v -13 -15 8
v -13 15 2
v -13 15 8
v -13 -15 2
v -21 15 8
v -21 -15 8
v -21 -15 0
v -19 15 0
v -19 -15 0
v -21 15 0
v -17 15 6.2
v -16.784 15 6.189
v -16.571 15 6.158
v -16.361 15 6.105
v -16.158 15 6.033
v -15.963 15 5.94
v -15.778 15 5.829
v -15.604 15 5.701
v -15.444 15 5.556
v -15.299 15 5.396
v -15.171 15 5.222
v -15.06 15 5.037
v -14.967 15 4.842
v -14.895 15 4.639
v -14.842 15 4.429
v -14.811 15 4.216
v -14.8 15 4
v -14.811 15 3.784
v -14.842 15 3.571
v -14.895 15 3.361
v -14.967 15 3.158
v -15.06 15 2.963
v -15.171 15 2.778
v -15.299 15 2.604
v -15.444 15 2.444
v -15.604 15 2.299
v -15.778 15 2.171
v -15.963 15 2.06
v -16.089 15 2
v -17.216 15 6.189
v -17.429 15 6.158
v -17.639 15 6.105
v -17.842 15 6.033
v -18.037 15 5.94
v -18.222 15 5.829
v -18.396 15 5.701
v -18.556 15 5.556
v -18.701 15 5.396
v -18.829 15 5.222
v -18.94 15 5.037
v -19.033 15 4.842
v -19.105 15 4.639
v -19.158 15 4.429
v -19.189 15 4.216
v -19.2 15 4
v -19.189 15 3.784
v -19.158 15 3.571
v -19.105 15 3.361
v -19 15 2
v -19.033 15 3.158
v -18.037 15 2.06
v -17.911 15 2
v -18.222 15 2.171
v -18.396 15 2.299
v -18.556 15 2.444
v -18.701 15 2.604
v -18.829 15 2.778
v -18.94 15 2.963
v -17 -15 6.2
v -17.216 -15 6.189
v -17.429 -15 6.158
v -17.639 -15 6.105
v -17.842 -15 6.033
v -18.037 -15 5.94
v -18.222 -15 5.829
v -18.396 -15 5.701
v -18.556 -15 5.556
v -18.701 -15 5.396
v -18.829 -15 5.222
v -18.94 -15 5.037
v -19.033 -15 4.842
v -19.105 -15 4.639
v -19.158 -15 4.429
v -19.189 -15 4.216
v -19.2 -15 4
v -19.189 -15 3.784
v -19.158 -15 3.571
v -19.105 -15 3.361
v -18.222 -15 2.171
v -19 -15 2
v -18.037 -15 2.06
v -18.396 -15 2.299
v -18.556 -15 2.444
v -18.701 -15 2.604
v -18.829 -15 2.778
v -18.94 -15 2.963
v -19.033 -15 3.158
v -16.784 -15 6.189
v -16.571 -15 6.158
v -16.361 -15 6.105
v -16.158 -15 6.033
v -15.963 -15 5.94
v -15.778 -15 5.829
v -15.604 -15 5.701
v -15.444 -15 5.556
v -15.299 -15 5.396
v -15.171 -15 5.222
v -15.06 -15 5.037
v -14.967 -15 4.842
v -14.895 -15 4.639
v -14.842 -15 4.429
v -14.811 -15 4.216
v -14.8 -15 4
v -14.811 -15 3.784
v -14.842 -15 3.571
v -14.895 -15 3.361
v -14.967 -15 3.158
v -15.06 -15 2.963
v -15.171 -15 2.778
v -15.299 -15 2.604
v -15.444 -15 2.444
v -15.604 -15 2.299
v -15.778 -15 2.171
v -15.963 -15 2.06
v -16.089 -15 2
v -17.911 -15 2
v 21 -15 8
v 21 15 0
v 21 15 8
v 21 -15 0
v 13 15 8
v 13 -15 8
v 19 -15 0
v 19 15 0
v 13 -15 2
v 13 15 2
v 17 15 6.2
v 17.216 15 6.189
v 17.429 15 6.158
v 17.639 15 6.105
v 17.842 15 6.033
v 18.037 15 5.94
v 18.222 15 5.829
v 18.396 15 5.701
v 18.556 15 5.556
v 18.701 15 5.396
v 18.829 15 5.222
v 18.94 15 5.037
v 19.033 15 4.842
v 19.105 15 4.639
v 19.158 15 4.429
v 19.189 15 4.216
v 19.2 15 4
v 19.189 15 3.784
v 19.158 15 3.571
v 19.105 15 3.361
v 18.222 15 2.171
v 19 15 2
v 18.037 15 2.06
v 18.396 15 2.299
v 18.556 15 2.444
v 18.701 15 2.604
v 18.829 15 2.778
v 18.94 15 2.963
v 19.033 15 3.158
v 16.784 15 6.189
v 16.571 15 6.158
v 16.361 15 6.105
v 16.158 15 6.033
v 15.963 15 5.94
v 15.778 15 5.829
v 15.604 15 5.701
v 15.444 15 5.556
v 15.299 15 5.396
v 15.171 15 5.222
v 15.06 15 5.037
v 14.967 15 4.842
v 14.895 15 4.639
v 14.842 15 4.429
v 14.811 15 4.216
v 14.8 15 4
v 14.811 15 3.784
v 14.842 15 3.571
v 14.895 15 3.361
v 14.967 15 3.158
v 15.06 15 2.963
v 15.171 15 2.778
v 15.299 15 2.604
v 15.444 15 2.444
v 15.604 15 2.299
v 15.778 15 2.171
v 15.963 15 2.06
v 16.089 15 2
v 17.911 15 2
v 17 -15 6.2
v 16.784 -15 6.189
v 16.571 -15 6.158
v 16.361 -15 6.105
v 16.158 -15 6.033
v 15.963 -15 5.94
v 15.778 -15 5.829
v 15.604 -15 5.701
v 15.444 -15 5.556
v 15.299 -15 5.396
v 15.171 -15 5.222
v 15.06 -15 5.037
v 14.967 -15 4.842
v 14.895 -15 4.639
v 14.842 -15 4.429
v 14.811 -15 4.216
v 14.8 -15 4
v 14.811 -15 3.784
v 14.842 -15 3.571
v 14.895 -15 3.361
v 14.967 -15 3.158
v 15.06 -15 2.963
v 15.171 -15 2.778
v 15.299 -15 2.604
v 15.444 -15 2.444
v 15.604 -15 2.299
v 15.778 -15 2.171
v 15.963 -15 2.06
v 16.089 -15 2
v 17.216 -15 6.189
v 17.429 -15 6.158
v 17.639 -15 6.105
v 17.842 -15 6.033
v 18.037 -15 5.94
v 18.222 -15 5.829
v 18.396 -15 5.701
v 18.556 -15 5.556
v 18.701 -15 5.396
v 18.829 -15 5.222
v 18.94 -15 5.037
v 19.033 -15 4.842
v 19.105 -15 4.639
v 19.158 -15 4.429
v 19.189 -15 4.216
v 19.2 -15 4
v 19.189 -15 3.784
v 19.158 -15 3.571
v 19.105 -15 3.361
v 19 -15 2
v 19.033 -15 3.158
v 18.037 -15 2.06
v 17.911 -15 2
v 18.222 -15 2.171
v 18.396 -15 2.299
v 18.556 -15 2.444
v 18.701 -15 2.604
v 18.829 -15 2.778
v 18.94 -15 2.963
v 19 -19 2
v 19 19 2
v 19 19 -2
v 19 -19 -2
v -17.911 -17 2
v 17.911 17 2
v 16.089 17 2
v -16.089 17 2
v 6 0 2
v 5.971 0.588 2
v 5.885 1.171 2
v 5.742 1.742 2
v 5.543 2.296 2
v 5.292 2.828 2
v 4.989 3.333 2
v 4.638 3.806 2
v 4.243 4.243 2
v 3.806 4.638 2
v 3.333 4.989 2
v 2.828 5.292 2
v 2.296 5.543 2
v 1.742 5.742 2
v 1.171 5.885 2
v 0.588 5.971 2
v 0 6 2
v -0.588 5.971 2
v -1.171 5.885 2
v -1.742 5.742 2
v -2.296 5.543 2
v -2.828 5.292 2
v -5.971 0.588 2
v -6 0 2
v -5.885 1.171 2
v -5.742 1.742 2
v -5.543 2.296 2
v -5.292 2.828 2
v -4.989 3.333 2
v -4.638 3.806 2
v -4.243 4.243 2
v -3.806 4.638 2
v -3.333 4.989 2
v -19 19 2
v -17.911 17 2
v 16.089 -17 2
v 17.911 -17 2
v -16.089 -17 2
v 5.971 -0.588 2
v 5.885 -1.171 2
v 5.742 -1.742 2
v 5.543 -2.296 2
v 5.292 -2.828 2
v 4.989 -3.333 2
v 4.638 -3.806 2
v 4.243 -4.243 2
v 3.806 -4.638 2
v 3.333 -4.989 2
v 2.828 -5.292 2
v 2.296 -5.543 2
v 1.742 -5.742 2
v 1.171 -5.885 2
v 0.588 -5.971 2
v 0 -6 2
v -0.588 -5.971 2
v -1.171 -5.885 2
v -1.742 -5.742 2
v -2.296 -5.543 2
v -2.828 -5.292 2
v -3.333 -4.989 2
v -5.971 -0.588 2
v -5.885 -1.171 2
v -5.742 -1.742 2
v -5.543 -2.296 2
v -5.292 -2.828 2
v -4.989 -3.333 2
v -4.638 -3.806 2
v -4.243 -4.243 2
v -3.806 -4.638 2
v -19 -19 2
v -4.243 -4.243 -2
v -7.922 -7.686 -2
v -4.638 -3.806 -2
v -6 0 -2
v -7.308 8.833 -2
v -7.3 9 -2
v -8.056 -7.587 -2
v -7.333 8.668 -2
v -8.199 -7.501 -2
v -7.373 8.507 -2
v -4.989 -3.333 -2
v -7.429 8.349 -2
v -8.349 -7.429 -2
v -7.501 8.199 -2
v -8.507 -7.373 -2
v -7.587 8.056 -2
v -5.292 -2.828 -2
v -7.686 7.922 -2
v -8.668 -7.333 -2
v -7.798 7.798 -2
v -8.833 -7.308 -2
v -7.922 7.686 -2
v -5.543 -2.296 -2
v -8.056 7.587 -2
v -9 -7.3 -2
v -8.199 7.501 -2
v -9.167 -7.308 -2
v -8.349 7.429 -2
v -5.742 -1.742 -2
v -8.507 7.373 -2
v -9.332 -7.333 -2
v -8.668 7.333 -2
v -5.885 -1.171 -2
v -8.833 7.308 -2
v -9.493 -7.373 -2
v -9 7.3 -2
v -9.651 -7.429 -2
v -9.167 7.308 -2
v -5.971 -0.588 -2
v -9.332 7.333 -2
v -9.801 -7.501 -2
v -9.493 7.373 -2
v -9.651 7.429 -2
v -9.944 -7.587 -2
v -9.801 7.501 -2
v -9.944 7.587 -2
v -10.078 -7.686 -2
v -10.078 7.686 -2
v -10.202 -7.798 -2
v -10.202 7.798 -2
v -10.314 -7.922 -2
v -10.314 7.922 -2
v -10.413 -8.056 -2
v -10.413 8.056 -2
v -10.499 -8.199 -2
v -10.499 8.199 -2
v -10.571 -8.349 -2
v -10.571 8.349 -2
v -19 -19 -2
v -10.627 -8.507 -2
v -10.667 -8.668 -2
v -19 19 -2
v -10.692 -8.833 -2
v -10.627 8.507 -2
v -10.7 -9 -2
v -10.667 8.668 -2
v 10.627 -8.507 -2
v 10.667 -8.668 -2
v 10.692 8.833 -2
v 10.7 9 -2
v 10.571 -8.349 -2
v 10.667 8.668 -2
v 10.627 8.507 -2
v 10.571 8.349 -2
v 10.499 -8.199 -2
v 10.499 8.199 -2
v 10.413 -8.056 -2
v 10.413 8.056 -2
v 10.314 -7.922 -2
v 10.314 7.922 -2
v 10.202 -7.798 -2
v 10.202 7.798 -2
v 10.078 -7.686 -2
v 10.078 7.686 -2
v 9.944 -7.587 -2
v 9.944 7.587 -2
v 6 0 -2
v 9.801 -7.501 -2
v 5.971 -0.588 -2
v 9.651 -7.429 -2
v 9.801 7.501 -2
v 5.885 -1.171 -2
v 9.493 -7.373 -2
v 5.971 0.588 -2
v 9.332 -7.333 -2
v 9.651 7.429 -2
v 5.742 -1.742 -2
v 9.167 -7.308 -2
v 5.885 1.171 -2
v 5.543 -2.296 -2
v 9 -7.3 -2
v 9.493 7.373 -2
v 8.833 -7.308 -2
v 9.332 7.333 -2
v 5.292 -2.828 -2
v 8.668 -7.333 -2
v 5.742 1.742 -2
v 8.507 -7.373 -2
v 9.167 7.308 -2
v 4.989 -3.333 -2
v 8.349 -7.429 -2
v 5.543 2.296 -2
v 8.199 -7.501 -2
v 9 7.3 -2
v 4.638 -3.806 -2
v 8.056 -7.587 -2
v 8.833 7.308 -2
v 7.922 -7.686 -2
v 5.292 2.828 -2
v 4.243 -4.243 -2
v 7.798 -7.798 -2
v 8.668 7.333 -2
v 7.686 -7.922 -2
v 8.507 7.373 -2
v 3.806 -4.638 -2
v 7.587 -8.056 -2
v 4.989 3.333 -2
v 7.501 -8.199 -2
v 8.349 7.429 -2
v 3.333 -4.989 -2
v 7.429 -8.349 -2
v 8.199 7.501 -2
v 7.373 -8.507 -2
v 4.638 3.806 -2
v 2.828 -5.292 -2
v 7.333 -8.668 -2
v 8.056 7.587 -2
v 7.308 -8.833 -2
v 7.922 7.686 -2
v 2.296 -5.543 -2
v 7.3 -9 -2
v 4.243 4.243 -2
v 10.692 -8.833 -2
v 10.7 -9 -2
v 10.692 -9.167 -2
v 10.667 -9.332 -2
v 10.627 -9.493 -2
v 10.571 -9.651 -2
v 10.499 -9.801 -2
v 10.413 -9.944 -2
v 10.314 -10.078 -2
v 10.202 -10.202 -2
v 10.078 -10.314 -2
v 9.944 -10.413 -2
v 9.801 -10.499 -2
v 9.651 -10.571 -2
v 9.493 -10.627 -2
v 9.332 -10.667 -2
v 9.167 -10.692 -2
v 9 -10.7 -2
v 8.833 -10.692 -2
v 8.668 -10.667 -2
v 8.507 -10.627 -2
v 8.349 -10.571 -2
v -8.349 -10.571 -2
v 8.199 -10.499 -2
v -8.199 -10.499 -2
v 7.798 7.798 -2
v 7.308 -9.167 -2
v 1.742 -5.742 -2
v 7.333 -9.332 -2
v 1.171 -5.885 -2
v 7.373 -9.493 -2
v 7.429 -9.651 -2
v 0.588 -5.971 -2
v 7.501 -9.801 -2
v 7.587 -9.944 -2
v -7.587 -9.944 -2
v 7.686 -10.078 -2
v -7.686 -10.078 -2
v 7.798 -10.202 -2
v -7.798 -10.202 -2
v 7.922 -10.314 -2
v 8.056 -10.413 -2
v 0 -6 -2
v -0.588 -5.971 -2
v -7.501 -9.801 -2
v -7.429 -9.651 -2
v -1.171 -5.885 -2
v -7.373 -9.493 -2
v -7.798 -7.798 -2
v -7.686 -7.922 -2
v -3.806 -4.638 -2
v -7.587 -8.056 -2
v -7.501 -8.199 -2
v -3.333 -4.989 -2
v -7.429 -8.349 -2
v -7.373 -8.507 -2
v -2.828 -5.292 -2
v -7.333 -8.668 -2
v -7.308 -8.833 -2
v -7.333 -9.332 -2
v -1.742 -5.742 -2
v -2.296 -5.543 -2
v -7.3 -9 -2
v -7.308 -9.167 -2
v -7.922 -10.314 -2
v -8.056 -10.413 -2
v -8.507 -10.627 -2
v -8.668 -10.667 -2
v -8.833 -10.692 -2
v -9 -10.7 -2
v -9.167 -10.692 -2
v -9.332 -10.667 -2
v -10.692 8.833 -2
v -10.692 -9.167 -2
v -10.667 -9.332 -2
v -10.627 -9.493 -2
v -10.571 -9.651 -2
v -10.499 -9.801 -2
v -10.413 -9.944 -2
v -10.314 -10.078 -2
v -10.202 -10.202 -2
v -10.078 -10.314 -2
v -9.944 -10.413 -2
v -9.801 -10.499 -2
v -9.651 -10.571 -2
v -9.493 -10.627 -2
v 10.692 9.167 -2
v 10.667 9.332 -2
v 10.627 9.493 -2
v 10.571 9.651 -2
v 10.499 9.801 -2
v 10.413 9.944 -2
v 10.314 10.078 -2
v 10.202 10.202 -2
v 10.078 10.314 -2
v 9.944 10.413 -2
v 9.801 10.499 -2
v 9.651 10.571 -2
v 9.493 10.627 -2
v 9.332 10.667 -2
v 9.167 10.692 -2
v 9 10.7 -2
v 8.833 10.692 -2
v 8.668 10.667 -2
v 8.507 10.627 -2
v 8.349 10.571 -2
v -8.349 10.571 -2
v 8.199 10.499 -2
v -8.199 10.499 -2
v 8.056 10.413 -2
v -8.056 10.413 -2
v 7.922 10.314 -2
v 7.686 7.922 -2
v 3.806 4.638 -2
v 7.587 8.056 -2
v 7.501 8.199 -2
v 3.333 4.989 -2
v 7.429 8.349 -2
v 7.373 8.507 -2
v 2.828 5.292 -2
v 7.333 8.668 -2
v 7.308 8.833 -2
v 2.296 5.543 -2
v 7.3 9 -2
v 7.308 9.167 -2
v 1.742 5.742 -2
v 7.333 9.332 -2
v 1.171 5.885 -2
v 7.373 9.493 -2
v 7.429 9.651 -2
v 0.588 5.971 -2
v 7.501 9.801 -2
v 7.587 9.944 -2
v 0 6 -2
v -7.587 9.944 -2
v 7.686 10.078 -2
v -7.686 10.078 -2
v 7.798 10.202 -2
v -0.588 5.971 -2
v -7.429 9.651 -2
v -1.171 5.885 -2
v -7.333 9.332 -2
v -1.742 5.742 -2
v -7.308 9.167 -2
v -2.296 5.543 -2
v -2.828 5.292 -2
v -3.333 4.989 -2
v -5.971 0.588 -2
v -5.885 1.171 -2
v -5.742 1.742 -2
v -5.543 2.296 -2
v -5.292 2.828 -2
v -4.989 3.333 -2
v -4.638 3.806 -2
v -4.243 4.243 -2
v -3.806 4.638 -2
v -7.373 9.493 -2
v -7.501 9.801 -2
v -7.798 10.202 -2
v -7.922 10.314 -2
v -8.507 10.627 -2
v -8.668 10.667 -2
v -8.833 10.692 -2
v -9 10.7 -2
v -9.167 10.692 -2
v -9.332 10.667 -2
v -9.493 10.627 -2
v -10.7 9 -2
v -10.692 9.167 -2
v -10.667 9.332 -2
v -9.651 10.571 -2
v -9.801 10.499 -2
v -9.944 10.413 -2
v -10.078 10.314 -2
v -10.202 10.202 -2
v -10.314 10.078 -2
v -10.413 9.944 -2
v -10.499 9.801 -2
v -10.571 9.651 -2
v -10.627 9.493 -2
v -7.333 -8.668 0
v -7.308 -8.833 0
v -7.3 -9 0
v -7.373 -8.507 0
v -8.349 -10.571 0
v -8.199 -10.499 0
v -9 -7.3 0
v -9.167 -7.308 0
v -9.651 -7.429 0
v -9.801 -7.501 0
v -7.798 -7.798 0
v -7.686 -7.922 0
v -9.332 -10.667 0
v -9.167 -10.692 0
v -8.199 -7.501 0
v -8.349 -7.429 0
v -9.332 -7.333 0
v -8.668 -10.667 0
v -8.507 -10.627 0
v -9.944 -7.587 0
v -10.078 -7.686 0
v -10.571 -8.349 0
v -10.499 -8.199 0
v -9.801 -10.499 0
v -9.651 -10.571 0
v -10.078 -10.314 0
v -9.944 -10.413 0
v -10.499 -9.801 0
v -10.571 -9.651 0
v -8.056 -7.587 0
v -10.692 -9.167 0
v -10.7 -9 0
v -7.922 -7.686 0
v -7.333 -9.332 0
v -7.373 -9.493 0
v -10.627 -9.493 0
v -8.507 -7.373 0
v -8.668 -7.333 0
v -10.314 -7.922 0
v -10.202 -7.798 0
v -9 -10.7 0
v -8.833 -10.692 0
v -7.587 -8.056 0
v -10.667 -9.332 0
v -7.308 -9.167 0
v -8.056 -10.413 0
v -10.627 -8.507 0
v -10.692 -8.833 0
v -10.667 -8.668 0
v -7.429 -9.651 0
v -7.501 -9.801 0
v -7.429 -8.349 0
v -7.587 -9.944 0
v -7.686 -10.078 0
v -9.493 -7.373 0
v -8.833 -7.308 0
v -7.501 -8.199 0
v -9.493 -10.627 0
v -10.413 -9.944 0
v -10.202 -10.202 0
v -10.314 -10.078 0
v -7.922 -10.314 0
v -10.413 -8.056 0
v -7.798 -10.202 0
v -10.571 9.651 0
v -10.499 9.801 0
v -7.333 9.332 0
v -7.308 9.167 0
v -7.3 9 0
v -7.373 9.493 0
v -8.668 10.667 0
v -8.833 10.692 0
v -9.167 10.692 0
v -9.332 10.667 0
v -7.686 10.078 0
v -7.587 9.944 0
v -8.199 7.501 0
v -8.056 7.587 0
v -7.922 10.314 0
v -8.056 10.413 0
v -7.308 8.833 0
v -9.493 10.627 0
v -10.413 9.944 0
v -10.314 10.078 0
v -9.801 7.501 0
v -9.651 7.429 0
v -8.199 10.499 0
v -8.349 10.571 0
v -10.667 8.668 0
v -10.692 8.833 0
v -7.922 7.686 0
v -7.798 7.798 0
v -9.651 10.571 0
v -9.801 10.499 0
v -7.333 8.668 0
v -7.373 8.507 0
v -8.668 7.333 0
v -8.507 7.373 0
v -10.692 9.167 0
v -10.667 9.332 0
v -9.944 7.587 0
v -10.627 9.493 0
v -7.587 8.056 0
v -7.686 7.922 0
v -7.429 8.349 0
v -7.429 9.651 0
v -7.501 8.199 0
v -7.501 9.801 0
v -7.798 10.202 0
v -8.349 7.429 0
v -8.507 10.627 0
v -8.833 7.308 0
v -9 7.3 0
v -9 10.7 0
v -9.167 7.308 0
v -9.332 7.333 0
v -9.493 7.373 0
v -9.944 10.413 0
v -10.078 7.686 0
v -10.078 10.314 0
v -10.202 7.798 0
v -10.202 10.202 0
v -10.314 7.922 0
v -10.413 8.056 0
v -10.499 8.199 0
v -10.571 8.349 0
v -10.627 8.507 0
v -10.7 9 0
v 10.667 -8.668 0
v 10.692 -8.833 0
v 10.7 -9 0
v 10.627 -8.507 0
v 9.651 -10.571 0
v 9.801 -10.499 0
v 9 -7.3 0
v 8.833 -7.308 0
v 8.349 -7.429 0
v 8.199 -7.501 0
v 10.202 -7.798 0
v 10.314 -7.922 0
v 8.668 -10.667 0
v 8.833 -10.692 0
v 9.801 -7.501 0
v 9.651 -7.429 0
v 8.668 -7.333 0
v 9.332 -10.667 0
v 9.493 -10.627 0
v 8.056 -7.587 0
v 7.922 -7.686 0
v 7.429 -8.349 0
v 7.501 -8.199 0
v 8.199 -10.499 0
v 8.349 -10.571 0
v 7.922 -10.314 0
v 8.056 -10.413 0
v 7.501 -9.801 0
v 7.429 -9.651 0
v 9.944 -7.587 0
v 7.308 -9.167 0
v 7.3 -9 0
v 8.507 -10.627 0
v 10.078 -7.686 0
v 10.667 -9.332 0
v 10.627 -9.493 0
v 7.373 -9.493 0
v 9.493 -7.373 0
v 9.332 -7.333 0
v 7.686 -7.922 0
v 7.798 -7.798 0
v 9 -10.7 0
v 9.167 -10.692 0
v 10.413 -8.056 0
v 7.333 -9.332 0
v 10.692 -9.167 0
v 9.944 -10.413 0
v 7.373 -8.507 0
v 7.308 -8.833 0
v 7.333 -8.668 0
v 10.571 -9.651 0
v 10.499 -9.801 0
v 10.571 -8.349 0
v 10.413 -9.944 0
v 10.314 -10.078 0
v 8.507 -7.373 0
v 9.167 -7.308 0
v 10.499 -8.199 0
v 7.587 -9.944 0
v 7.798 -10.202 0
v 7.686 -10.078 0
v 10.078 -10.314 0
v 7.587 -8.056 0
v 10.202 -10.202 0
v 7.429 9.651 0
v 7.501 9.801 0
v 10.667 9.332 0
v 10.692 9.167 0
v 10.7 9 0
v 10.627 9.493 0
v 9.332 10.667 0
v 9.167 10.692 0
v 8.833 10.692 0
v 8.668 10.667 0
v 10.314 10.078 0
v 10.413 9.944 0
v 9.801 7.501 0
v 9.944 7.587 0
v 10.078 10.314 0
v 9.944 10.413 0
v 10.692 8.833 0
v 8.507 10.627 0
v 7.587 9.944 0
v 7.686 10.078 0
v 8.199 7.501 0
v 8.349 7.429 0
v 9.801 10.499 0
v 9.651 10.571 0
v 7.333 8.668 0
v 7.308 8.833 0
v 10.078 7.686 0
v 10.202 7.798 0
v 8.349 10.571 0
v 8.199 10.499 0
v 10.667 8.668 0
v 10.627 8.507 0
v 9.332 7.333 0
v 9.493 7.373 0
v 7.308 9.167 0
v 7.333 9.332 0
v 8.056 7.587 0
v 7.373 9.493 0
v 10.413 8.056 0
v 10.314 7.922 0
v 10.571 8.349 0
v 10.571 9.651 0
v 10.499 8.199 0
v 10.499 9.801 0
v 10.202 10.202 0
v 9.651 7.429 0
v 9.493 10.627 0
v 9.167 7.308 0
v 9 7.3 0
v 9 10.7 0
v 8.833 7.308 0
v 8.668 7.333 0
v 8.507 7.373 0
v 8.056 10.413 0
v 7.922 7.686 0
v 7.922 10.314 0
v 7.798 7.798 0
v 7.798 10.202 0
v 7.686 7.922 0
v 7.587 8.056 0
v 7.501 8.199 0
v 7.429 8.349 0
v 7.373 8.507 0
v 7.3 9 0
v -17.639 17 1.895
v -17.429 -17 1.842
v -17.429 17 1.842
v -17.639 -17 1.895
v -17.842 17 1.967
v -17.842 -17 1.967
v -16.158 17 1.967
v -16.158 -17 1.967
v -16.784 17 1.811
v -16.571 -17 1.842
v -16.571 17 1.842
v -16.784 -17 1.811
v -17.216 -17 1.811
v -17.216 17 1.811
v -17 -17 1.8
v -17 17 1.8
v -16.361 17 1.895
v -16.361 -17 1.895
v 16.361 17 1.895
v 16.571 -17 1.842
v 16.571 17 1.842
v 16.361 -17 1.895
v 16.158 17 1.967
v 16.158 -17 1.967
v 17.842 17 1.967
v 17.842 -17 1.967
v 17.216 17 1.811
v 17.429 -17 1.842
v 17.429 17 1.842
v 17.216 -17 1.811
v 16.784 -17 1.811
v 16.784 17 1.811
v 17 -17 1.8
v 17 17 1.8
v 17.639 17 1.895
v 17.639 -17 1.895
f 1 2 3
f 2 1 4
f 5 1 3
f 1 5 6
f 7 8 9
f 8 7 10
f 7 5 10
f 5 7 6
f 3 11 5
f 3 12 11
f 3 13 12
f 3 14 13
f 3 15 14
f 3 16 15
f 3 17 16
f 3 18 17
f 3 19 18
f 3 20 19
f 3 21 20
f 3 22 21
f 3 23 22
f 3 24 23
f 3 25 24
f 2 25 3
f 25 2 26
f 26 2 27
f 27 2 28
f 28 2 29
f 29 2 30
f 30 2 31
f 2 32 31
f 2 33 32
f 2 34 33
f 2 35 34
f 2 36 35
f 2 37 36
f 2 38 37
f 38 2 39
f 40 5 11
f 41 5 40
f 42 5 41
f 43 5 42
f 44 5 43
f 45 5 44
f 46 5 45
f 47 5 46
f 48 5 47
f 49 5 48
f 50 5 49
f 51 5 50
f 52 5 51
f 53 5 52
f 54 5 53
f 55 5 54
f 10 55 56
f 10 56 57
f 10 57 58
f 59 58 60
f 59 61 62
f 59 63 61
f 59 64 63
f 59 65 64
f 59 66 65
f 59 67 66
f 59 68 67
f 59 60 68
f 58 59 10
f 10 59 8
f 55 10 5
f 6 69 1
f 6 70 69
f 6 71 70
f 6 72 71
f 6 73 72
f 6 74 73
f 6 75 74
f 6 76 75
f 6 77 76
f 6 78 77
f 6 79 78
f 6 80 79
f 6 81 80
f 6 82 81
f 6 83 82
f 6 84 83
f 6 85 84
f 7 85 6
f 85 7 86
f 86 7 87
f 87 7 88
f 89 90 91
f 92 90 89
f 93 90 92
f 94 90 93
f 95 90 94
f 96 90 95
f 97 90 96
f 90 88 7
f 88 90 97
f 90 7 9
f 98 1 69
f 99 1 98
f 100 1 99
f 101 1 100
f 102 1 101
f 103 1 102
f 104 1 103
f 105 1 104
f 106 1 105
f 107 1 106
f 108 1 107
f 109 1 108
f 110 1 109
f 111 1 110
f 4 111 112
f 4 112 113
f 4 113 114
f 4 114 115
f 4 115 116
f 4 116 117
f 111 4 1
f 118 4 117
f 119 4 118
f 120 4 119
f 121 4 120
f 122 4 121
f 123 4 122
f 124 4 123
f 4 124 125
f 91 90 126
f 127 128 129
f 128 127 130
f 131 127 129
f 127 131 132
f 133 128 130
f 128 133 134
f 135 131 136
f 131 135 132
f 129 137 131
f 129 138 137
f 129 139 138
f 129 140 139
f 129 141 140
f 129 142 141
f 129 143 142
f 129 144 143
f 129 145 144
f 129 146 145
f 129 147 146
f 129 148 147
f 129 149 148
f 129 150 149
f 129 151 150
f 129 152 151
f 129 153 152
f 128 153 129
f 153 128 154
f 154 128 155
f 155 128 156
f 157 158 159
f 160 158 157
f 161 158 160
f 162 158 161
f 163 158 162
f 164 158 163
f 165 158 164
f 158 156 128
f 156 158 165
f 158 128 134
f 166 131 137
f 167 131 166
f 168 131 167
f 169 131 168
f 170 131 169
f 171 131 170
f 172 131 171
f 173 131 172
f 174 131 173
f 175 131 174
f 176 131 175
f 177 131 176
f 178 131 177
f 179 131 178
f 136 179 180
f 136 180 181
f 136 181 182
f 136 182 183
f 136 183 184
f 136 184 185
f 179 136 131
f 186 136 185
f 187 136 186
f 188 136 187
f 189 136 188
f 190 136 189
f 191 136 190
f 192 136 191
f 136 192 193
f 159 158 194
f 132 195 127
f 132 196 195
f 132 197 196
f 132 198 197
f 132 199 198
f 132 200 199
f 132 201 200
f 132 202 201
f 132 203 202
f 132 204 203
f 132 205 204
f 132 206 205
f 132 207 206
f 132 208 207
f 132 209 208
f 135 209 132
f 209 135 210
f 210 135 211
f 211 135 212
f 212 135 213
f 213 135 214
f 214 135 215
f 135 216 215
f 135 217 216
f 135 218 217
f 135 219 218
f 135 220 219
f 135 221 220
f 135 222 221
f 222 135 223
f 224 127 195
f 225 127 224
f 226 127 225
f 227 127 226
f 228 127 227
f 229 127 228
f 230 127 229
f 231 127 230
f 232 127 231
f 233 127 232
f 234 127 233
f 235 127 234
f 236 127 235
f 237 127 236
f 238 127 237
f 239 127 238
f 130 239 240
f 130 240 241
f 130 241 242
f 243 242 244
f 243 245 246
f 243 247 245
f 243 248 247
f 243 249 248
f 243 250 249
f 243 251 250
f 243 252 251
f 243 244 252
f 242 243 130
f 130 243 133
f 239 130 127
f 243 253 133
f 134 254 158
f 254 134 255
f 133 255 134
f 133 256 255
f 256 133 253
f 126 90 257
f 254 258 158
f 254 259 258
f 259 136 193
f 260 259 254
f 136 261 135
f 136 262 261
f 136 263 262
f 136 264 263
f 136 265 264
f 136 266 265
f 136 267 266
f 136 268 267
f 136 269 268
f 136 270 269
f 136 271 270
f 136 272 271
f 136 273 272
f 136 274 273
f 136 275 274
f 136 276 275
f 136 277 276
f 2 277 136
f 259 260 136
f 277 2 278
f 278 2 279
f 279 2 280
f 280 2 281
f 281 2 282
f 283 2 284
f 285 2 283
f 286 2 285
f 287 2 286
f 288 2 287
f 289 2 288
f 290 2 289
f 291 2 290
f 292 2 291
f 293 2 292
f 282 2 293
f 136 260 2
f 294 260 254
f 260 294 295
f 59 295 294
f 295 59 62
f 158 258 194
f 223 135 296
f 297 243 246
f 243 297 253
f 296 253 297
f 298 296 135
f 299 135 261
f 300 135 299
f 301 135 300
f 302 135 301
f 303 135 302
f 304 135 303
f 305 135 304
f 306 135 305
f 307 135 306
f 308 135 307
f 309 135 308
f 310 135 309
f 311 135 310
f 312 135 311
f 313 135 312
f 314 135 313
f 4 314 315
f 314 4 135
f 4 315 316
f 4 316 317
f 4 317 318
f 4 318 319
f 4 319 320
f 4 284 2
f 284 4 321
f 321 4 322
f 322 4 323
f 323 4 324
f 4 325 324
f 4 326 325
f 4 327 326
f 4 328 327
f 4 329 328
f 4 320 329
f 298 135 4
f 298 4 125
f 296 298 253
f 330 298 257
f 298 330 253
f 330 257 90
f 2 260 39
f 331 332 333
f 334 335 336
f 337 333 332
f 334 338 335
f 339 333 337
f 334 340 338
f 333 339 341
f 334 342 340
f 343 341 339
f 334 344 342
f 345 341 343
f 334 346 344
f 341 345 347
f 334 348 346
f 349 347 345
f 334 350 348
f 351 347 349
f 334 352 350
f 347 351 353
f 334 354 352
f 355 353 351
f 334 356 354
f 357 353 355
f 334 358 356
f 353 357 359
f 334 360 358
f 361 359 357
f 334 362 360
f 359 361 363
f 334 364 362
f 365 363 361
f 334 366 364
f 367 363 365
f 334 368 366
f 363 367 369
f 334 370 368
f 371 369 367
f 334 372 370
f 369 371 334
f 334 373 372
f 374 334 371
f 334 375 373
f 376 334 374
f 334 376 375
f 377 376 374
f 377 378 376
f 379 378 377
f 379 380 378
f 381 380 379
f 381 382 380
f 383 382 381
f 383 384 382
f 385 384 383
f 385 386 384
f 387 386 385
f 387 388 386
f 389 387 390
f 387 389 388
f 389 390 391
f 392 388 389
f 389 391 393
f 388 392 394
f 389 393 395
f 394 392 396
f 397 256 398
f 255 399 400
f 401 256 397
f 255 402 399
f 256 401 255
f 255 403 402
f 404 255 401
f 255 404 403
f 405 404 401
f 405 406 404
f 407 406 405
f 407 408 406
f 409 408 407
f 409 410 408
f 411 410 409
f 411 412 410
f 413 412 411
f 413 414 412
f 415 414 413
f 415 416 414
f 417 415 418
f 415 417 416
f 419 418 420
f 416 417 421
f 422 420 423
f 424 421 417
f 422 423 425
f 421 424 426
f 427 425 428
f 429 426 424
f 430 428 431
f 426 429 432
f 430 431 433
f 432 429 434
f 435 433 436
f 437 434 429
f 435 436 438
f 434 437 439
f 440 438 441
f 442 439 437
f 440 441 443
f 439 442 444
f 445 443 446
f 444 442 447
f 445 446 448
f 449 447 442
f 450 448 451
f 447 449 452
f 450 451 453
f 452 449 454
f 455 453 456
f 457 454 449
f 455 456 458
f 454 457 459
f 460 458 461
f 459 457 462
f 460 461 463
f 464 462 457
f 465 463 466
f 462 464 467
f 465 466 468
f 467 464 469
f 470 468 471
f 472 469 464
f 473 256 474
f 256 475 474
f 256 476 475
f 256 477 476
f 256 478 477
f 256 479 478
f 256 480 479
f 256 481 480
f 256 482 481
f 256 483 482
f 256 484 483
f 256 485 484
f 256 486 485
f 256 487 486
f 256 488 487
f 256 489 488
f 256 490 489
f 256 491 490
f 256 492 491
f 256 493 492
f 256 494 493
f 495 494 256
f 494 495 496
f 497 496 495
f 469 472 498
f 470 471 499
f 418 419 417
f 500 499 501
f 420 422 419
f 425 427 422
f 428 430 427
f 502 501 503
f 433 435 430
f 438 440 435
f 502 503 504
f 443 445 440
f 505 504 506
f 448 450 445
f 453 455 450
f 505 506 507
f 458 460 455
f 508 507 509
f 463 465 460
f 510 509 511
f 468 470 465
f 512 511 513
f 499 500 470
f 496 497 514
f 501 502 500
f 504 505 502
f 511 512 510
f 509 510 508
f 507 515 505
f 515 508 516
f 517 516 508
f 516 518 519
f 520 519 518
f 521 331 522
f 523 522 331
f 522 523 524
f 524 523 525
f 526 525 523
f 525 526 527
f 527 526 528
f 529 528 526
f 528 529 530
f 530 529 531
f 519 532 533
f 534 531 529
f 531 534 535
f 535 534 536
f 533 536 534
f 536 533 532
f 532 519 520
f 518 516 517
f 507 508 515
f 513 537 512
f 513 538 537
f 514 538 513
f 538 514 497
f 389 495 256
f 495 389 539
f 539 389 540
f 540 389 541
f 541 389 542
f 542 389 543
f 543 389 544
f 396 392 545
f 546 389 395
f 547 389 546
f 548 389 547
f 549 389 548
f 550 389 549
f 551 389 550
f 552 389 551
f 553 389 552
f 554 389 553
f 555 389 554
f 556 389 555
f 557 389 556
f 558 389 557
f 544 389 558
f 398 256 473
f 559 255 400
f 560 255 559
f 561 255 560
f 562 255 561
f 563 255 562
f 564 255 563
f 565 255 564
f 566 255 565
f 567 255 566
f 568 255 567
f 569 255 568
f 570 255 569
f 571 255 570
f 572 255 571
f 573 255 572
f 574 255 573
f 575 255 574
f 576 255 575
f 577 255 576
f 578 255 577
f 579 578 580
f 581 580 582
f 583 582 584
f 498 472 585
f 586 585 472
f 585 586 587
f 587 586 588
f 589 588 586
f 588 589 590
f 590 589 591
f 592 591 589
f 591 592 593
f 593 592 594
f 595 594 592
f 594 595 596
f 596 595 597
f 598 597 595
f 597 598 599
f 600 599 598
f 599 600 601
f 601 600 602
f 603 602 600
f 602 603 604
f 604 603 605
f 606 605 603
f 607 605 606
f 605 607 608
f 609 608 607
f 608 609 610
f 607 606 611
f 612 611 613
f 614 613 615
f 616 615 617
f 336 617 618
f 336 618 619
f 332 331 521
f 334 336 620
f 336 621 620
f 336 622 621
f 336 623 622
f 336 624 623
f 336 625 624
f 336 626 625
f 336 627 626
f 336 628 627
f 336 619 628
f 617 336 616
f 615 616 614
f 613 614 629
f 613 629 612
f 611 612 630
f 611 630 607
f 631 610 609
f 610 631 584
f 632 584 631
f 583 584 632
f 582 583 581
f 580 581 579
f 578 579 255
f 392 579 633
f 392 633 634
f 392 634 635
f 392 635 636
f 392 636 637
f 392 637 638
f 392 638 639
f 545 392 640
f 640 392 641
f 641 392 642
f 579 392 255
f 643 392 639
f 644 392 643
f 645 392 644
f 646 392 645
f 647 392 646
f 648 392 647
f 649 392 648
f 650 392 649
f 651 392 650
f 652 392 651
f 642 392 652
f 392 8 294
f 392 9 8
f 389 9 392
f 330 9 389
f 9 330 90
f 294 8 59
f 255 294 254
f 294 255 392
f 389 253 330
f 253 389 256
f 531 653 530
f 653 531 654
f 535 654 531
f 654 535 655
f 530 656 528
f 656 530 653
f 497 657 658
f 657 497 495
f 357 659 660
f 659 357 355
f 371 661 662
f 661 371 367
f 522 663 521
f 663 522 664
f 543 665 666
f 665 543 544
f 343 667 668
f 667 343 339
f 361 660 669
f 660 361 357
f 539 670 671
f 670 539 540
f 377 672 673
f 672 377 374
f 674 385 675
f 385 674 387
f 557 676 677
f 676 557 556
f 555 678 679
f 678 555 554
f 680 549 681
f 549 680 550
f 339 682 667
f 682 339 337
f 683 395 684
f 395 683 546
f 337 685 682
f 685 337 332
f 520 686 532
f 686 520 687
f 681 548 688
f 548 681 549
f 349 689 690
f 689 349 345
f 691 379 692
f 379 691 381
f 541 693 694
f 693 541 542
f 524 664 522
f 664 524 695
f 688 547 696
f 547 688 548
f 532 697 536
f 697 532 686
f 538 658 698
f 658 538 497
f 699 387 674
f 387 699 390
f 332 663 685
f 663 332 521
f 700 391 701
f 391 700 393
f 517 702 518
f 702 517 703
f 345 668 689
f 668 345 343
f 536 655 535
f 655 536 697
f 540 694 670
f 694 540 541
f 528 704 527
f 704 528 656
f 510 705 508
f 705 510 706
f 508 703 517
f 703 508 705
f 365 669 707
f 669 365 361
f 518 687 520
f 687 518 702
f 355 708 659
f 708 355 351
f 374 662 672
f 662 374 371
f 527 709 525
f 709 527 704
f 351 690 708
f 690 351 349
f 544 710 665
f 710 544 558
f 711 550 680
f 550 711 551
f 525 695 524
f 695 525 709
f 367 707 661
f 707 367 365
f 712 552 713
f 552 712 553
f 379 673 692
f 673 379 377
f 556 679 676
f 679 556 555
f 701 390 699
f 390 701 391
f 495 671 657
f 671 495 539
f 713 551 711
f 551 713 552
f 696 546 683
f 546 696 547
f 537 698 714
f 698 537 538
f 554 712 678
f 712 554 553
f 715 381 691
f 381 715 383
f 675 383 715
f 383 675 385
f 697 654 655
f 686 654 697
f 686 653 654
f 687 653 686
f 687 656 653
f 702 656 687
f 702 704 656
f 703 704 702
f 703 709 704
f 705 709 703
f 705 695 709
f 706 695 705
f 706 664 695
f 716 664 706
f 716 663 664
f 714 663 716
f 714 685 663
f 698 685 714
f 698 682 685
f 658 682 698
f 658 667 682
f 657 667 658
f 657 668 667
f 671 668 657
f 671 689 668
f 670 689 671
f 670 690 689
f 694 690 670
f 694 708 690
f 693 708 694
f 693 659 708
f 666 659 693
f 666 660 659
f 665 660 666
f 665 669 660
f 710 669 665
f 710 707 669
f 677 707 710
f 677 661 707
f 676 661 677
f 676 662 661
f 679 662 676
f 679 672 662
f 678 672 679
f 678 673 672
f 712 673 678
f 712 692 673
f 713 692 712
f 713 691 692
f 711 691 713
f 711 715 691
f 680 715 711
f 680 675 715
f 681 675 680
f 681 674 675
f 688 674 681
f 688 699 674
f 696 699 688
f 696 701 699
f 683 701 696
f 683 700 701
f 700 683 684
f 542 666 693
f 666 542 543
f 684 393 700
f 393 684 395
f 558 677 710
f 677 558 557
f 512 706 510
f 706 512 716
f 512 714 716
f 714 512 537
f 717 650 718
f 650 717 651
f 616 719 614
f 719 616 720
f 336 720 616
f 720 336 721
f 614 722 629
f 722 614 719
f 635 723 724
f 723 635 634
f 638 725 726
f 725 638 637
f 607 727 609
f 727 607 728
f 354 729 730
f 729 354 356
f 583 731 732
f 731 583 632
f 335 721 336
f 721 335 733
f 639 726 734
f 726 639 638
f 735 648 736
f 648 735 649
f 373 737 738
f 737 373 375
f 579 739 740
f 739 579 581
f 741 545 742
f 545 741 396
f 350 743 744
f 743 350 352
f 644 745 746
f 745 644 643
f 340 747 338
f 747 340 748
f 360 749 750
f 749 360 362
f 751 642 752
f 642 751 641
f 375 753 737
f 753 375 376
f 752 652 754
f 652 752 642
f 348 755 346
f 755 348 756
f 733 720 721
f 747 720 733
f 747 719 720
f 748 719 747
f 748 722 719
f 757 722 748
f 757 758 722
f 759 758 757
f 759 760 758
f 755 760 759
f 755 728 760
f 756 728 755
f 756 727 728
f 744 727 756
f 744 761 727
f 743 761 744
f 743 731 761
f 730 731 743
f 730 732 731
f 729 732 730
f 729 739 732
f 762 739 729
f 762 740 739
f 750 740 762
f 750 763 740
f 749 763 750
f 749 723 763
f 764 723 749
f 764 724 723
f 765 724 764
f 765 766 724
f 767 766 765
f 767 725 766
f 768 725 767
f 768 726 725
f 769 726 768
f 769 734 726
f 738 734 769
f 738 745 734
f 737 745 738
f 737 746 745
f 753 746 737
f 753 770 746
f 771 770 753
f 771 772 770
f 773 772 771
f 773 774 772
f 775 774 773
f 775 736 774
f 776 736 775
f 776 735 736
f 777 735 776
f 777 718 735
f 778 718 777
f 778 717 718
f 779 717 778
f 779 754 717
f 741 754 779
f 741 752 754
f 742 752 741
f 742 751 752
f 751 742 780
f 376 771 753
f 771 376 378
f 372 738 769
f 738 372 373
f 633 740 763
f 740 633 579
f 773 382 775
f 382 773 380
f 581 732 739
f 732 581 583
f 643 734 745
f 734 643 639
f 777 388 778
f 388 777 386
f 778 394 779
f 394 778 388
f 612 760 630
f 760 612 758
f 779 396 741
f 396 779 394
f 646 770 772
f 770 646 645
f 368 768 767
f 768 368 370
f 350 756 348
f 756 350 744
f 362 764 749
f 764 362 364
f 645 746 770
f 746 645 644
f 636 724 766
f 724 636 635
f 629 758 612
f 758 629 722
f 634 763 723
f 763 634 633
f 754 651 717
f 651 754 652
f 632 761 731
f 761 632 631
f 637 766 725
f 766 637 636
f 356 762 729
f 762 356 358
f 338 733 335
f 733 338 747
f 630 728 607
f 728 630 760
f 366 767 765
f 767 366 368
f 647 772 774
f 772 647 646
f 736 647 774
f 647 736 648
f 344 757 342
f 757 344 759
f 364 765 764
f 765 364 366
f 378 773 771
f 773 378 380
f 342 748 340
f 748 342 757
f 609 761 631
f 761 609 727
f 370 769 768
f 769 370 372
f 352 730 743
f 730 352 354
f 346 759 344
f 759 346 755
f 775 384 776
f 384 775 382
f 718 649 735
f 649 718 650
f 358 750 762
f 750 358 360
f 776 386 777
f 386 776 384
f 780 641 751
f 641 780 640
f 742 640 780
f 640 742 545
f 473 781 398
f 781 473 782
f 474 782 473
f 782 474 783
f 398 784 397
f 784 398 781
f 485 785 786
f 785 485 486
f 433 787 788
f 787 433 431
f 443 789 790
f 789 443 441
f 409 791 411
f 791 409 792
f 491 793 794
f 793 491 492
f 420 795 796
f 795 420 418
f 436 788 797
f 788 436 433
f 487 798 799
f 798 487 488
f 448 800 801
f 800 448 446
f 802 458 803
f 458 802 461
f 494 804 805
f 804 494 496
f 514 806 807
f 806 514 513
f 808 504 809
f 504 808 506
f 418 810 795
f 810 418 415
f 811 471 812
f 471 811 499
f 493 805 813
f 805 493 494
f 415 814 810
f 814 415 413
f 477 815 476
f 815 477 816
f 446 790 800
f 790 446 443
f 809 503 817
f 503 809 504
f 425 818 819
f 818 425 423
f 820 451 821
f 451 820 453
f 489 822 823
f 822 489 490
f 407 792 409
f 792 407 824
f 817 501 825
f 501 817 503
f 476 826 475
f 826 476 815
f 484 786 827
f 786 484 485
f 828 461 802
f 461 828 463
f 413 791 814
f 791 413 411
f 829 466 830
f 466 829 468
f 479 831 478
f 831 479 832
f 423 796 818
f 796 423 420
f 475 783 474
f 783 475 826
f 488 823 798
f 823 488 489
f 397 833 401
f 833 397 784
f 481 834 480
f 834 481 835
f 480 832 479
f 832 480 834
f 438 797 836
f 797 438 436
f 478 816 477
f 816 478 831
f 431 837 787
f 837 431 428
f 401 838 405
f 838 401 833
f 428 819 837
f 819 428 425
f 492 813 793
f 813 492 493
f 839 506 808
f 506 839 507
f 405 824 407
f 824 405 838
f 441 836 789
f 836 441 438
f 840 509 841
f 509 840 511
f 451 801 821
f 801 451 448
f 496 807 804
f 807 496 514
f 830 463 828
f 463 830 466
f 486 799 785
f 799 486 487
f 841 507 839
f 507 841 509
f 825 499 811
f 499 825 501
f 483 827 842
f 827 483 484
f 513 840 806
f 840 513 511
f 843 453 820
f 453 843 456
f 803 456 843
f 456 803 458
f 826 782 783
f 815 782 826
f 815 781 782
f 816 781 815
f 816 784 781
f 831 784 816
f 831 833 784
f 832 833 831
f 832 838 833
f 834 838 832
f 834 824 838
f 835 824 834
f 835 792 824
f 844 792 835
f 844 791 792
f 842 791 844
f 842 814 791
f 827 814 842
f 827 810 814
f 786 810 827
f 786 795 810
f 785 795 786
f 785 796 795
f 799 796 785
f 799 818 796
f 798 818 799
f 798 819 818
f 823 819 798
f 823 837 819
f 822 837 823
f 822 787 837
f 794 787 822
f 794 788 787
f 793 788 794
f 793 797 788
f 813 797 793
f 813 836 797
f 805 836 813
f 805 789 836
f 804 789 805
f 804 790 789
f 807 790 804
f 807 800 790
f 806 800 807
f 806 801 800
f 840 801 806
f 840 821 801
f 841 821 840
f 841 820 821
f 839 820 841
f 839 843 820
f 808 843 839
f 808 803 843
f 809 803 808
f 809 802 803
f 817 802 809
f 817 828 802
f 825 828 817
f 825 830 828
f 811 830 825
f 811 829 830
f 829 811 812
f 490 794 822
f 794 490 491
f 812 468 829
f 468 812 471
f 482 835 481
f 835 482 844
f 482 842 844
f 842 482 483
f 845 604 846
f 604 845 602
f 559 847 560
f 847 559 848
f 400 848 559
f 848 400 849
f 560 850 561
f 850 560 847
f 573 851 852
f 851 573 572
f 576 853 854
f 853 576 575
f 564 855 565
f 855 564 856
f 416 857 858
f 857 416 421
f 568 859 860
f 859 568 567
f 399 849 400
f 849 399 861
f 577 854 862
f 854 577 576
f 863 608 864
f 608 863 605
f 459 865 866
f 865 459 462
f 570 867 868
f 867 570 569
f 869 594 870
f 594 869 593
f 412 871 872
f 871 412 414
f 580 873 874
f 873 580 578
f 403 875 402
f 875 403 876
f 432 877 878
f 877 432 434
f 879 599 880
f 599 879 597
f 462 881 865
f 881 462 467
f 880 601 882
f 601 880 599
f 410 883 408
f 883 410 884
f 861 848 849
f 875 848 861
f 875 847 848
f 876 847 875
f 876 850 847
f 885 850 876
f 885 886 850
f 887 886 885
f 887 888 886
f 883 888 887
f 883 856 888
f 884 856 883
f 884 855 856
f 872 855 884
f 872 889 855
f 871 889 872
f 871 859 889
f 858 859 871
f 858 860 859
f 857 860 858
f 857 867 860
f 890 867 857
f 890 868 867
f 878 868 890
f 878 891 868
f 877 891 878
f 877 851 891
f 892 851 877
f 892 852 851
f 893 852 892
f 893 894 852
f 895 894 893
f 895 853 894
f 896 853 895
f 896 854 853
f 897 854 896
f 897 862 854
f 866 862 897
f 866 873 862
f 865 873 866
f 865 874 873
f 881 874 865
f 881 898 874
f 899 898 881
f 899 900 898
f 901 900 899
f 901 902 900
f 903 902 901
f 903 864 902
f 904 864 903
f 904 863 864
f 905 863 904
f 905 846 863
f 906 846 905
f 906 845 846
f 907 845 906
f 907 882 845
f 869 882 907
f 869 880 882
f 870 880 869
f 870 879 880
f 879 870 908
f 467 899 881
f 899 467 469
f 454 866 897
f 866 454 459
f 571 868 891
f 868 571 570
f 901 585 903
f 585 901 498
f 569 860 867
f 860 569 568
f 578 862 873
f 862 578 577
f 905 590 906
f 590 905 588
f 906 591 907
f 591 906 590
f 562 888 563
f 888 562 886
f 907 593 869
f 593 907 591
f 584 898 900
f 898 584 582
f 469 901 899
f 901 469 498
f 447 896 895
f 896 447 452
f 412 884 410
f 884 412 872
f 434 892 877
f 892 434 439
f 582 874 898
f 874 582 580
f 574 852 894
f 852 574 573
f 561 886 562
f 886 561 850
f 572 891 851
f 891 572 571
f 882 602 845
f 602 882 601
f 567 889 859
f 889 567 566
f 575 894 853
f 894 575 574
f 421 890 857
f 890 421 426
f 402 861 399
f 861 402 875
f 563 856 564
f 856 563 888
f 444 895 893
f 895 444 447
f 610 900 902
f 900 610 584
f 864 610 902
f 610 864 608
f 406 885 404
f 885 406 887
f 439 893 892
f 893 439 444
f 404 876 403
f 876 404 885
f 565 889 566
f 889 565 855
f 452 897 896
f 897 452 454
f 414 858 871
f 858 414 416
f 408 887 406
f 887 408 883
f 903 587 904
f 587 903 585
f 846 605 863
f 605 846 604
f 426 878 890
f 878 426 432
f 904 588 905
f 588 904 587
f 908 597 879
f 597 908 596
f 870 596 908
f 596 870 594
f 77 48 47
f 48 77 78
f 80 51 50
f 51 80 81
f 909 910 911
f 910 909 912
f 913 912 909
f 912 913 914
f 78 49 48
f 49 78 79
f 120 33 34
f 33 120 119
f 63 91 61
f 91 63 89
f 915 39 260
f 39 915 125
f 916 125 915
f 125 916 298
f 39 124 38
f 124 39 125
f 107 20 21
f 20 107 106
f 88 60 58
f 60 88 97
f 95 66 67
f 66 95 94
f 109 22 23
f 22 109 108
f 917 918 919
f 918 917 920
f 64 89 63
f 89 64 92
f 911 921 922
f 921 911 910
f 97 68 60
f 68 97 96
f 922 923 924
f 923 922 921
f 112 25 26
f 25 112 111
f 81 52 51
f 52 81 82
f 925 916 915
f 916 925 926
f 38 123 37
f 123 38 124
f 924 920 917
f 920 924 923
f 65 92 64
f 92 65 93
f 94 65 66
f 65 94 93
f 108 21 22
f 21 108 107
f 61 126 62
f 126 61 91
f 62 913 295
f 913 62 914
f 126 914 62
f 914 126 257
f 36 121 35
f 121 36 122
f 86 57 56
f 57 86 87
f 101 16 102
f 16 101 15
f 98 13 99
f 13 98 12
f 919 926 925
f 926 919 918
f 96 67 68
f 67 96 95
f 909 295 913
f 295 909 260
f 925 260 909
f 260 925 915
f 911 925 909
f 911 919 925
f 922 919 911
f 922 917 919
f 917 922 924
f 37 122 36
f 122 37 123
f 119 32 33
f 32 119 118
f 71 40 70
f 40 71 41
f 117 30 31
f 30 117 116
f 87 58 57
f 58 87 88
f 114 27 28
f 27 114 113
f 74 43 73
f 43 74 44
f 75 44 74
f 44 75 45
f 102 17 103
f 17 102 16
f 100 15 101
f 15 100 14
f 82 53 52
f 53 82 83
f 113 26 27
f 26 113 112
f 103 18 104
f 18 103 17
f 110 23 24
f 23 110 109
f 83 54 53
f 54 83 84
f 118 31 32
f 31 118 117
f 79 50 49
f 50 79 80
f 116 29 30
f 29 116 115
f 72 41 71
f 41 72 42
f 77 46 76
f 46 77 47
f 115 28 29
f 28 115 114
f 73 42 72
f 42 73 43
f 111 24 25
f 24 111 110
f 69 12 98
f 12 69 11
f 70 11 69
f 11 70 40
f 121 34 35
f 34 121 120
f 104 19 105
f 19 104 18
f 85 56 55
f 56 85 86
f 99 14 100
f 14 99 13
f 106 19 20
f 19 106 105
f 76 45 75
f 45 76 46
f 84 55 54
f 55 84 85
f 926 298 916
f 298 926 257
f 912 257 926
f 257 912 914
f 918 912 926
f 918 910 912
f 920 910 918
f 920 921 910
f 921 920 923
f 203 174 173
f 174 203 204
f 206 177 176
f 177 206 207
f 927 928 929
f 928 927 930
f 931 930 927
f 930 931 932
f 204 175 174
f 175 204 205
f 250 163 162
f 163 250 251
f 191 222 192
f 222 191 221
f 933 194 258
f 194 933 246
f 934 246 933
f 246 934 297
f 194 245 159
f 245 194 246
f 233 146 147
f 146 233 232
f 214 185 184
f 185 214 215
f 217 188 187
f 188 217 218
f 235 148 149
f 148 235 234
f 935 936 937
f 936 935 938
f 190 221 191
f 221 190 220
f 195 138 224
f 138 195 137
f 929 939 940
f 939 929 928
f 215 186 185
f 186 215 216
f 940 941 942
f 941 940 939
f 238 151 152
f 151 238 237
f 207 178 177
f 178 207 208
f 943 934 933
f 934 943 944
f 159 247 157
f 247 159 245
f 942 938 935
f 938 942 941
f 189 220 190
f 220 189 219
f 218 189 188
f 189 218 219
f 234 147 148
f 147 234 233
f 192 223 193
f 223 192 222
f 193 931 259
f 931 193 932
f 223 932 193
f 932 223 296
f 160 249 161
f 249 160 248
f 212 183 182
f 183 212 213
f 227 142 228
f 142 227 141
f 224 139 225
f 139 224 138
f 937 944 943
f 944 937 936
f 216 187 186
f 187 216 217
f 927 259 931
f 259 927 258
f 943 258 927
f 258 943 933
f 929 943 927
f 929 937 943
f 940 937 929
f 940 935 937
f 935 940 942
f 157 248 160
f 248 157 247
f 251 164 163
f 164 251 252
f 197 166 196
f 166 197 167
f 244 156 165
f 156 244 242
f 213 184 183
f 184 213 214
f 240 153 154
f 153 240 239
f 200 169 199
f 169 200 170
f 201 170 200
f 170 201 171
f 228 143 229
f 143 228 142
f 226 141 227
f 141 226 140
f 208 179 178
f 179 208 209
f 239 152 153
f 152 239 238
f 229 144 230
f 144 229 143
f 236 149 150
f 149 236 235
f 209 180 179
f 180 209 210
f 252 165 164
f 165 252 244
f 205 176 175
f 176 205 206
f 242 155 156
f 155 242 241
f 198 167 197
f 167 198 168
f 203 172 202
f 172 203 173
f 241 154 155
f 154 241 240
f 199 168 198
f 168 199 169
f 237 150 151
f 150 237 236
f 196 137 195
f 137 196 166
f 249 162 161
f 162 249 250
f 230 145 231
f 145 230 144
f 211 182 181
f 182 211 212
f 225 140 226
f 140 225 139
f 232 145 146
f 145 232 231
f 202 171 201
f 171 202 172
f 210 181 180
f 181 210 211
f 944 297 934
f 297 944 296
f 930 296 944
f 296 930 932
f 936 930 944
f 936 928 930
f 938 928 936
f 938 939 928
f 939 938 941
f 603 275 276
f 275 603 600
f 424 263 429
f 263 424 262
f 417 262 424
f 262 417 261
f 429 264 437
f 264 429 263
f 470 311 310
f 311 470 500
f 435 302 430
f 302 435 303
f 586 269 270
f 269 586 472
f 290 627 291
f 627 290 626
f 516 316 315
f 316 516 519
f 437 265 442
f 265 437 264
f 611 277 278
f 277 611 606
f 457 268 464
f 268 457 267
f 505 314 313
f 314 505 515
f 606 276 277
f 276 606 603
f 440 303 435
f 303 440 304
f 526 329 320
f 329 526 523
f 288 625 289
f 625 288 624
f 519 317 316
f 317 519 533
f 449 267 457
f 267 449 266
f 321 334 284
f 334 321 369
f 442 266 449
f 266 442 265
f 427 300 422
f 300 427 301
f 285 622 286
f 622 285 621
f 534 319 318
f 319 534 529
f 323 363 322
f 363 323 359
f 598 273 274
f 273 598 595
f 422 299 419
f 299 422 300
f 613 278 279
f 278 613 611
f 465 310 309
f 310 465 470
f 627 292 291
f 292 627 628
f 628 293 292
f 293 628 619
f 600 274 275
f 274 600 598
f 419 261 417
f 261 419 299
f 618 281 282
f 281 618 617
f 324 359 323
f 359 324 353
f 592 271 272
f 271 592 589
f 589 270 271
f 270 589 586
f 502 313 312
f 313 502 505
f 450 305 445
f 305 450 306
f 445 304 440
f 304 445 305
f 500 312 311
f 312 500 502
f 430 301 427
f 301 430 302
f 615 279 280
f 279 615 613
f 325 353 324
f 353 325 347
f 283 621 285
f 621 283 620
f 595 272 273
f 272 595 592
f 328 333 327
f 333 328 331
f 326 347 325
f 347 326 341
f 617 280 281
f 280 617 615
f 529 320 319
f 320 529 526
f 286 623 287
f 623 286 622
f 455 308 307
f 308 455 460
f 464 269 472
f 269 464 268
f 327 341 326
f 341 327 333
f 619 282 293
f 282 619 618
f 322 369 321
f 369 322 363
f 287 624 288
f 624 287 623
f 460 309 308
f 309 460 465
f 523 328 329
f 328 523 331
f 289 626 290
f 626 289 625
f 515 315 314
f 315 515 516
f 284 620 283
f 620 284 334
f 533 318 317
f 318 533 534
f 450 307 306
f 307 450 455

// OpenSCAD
// file: parameters.scad
// 135er Universal Helicopter Controller - Cyclic V1 parameters
$fn = 64;

base_x = 220;
base_y = 180;
base_h = 18;
wall = 5;

shaft_d = 8.2;
bearing_od = 22.2;
bearing_w = 7.2;

gimbal_outer_x = 120;
gimbal_outer_y = 100;
gimbal_bar = 18;
gimbal_h = 18;

tube_od = 22.2;
tube_clamp_wall = 6;

sensor_board_x = 23;
sensor_board_y = 23;
sensor_gap = 2.0;

m4_clearance = 4.4;
m3_clearance = 3.4;
// main file
include <parameters.scad>;

plate_x = 38;
plate_y = 38;
plate_h = 4;

difference(){
    union(){
        cube([plate_x,plate_y,plate_h],center=true);

        // Two adjustment ears.
        for (x=[-17,17])
            translate([x,0,4])
                cube([8,30,8],center=true);
    }

    // Central clearance around magnetic axis.
    cylinder(h=20,d=12,center=true);

    // PCB mounting holes.
    for (x=[-9,9])
        for (y=[-9,9])
            translate([x,y,-10])
                cylinder(h=20,d=m3_clearance,center=true);

    // Slotted structural mounts for adjustment.
    for (x=[-17,17])
        hull(){
            translate([x,-7,4]) rotate([90,0,0]) cylinder(h=20,d=m4_clearance,center=true);
            translate([x, 7,4]) rotate([90,0,0]) cylinder(h=20,d=m4_clearance,center=true);
        }
}
